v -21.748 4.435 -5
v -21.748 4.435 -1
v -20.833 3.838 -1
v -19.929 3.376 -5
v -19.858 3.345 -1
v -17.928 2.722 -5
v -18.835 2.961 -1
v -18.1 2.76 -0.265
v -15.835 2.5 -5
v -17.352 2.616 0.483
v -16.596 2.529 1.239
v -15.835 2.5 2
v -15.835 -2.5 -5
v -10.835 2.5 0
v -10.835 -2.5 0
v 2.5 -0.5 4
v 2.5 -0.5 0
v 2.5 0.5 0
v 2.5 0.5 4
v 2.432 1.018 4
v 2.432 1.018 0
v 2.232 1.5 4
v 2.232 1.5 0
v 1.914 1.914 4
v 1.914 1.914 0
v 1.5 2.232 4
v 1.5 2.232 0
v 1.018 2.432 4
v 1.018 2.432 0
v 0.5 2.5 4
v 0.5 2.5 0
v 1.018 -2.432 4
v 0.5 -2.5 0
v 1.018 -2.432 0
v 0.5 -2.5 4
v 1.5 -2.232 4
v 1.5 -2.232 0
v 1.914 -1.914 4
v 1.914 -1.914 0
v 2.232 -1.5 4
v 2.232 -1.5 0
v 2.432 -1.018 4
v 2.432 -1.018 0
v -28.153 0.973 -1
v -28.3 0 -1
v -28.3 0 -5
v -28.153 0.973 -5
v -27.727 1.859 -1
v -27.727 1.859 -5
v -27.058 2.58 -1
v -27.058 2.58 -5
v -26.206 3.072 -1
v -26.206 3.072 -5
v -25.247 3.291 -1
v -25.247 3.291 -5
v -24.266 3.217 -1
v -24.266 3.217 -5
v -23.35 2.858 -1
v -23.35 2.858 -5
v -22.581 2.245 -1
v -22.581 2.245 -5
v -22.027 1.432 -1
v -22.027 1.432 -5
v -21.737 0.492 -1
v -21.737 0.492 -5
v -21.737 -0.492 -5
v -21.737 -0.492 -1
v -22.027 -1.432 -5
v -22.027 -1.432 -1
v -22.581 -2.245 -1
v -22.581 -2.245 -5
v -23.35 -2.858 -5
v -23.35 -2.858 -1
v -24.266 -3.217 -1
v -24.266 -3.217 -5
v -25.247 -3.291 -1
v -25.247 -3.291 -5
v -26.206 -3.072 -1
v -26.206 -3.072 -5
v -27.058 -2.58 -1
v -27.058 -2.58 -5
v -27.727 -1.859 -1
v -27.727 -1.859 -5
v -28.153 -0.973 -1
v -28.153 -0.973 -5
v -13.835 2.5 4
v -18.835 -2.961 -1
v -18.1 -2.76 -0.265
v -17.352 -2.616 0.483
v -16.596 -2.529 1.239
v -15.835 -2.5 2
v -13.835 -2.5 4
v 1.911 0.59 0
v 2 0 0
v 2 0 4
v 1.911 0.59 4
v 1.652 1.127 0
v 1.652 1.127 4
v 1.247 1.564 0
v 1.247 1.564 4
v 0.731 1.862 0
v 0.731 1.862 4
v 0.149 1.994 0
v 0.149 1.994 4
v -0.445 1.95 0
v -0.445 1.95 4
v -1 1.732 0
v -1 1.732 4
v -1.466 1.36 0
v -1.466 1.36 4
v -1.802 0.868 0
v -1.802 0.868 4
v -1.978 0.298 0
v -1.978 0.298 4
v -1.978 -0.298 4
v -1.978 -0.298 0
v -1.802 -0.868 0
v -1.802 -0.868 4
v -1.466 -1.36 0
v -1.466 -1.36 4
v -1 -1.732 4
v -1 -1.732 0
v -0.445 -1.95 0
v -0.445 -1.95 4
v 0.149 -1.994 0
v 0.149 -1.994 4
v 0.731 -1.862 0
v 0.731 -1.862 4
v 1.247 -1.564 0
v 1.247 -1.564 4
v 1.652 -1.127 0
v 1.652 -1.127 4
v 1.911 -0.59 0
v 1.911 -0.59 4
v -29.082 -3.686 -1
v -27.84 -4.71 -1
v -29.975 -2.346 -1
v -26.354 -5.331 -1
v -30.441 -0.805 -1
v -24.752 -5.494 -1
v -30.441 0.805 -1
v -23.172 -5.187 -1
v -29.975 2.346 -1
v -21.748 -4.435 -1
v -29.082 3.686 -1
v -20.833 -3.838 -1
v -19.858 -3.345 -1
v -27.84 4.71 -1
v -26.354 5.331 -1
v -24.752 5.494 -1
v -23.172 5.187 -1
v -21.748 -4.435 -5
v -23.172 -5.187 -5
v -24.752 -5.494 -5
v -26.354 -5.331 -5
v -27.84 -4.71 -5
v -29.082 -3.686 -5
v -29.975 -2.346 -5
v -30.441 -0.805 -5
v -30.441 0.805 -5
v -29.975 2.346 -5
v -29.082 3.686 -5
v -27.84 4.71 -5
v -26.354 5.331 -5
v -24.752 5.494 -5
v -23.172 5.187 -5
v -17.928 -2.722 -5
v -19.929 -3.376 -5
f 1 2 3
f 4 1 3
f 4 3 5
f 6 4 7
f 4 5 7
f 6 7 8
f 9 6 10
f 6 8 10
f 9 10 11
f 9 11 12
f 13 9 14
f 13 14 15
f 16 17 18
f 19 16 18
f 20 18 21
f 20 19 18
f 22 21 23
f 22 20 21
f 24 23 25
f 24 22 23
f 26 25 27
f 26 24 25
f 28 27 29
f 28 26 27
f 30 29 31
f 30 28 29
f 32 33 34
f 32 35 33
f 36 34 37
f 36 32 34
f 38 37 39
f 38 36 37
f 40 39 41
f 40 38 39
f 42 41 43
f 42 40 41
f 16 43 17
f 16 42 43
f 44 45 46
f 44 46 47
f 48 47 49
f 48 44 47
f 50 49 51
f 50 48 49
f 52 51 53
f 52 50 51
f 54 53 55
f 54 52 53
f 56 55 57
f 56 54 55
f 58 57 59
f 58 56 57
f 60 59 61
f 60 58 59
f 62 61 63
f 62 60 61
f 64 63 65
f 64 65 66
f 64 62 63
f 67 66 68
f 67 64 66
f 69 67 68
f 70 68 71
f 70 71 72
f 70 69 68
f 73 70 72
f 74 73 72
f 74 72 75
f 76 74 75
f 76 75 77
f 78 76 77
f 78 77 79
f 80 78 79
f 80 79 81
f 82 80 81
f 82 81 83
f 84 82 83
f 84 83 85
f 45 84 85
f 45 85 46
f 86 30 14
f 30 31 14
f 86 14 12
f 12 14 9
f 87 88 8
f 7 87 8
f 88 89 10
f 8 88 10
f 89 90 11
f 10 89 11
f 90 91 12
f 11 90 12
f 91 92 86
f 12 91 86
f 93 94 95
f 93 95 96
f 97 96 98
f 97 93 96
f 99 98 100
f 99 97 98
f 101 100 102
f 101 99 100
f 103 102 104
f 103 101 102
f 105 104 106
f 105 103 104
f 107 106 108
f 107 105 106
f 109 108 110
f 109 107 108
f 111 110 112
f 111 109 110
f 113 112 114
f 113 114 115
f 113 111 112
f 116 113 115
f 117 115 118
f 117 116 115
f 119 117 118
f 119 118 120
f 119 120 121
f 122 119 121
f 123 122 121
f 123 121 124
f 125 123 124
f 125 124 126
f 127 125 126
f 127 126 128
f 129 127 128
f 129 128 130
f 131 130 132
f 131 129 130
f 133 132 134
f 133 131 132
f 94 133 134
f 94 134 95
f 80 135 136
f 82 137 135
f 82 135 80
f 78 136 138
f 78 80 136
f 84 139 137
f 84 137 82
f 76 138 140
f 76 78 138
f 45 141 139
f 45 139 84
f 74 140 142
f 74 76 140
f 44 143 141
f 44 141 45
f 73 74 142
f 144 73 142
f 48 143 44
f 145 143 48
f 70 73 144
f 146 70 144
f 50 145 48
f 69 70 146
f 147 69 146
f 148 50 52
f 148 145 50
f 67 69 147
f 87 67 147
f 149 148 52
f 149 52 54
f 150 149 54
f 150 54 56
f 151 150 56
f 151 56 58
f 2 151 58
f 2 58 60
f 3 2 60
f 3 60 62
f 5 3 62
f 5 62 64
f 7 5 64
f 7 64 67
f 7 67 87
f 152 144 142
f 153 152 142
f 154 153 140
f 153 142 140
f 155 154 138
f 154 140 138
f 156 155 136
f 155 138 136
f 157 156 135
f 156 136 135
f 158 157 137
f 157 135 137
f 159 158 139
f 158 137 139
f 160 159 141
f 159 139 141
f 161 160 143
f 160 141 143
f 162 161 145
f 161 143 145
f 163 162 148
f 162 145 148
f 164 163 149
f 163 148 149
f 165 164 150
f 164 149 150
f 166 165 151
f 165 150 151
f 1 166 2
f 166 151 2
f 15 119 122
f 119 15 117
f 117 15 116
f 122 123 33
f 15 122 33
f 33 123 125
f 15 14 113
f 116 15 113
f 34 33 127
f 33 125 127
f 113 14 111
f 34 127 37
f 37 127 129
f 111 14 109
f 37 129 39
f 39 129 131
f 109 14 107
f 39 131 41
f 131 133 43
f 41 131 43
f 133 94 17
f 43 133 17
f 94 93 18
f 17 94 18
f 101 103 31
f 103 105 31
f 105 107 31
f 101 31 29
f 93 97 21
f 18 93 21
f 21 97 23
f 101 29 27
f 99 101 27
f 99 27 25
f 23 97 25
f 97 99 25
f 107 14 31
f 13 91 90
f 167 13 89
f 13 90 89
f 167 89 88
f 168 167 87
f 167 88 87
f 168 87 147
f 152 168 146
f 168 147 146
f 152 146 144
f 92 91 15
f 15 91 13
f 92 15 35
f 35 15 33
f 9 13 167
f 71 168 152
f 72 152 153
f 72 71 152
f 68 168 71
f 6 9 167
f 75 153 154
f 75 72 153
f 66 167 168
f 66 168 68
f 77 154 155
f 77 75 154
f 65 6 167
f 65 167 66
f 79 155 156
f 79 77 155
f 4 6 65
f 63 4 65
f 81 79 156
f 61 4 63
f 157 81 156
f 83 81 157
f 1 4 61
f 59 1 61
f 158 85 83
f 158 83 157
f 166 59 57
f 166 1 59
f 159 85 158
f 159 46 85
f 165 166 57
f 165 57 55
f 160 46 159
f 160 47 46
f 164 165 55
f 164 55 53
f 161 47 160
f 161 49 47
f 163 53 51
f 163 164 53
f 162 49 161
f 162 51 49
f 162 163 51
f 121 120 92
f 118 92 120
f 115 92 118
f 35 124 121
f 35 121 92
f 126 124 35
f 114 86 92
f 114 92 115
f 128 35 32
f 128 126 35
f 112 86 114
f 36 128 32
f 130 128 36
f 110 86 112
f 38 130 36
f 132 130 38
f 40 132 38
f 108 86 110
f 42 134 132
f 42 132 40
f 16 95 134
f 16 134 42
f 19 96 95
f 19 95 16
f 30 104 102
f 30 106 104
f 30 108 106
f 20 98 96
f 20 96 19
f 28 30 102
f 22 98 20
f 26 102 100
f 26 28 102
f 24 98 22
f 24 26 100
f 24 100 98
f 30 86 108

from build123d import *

# Parameters (mm, degrees)
SKETCH_1_R          = 2
EXTRUDE_1_DEPTH     = 4
FILLET_1_R          = 10
FILLET_2_R          = 2
SKETCH_8_R          = 3.300000000000001
EXTRUDE_3_DEPTH     = 5
CHAMFER_1_SIZE      = 5
SKETCH_9_R          = 3.300000000000001
CUT_EXTRUDE_3_DEPTH = 5
CHAMFER_2_SIZE      = 5


with BuildPart() as part:
    # ｽｹｯﾁ1 → ﾎﾞｽ - 押し出し1 (new body)
    # profile 1 of 5: a face of its own
    with BuildSketch(Plane.XY):
        with BuildLine():
            ThreePointArc((-27.5, 2.1540659228538024), (-27.33345237791561, 2.333452377915602), (-27.15406592285381, 2.49999999999999))
            Line((-27.154065922853814, 2.499999999999997), (-27.499999999999996, 2.499999999999997))
            Line((-27.499999999999996, 2.499999999999997), (-27.499999999999996, 2.154065922853802))
        make_face()
    # profile 2 of 5: a face of its own
    with BuildSketch(Plane.XY):
        with BuildLine():
            Line((-27.5, -2.500000000000003), (-27.154065922853817, -2.500000000000003))
            ThreePointArc((-27.154065922853817, -2.499999999999992), (-27.333452377915613, -2.3334523779156044), (-27.5, -2.1540659228538055))
            Line((-27.5, -2.1540659228538055), (-27.5, -2.500000000000003))
        make_face()
    # profile 3 of 5: a face of its own
    with BuildSketch(Plane.XY):
        with BuildLine():
            ThreePointArc((-20.10102051443362, 2.49999999999994), (-30.499999999999996, -2.39e-15), (-20.101020514433618, -2.4999999999999454))
            Line((-20.1010205144336, -2.500000000000002), (-22.84593407714621, -2.5000000000000027))
            ThreePointArc((-22.845934077146207, -2.5000000000000133), (-25.000000000000018, -3.3000000000000043), (-27.154065922853817, -2.499999999999992))
            Line((-27.154065922853817, -2.500000000000003), (-27.5, -2.500000000000003))
            Line((-27.5, -2.500000000000003), (-27.5, -2.1540659228538055))
            ThreePointArc((-27.5, -2.1540659228538055), (-28.3, -1.19e-15), (-27.5, 2.1540659228538024))
            Line((-27.499999999999996, 2.154065922853802), (-27.499999999999996, 2.499999999999997))
            Line((-27.499999999999996, 2.499999999999997), (-27.154065922853814, 2.499999999999997))
            ThreePointArc((-27.15406592285381, 2.49999999999999), (-25.000000000000014, 3.299999999999998), (-22.845934077146207, 2.500000000000007))
            Line((-22.84593407714621, 2.4999999999999982), (-20.1010205144336, 2.4999999999999987))
        make_face()
    # profile 4 of 5: a face of its own
    with BuildSketch(Plane.XY):
        with BuildLine():
            Line((-22.84593407714621, -2.5000000000000027), (-20.1010205144336, -2.500000000000002))
            ThreePointArc((-20.101020514433618, -2.4999999999999454), (-19.652365608485606, -1.2856151891963796), (-19.500000000000004, -4.41e-15))
            ThreePointArc((-19.500000000000004, -3.06e-15), (-19.652365608485606, 1.2856151891963756), (-20.10102051443362, 2.49999999999994))
            Line((-20.1010205144336, 2.4999999999999987), (-22.84593407714621, 2.4999999999999982))
            ThreePointArc((-22.845934077146207, 2.5000000000000067), (-22.00013187411367, 1.3750604449591433), (-21.7, -3.06e-15))
            ThreePointArc((-21.7, -3.87e-15), (-22.00013187411367, -1.3750604449591517), (-22.845934077146207, -2.5000000000000133))
        make_face()
    # profile 5 of 5: a face of its own
    with BuildSketch(Plane.XY):
        with BuildLine():
            Line((-20.1010205144336, -2.500000000000002), (2.5, -2.4999999999999996))
            Line((2.5, -2.4999999999999996), (2.499999999999999, 2.500000000000005))
            Line((2.499999999999999, 2.500000000000005), (-20.1010205144336, 2.4999999999999987))
            ThreePointArc((-20.10102051443362, 2.49999999999994), (-19.652365608485606, 1.2856151891963756), (-19.500000000000004, -3.06e-15))
            ThreePointArc((-19.500000000000004, -4.41e-15), (-19.652365608485606, -1.2856151891963796), (-20.101020514433618, -2.4999999999999454))
        make_face()
        Circle(SKETCH_1_R, mode=Mode.SUBTRACT)
    extrude(amount=EXTRUDE_1_DEPTH)

    # ﾌｨﾚｯﾄ1
    fillet_1_edges = [part.edges().sort_by_distance(p)[0] for p in [
        (-20.10102051443361, 2.4999999999999694, 2),
        (-20.10102051443361, -2.4999999999999742, 2),
    ]]
    fillet(fillet_1_edges, radius=FILLET_1_R)

    # ﾌｨﾚｯﾄ2
    fillet_2_edges = [part.edges().sort_by_distance(p)[0] for p in [
        (2.499999999999999, 2.500000000000005, 2),
        (2.5, -2.4999999999999996, 2),
    ]]
    fillet(fillet_2_edges, radius=FILLET_2_R)

    # ｽｹｯﾁ8 → ﾎﾞｽ - 押し出し3 (add)
    with BuildSketch(Plane(origin=(0, 0, 0), x_dir=(-1, 0, 0), z_dir=(0, 0, -1))):
        with BuildLine():
            Line((15.83484861008833, 2.5), (15.834848610088294, -2.500000000000004))
            ThreePointArc((15.834848610088294, -2.500000000000004), (18.945703694279587, -2.996180733770167), (21.747849506805537, -4.435483870967743))
            ThreePointArc((21.747849506805537, -4.435483870967743), (30.499999999999996, -3.06e-15), (21.747849506805537, 4.435483870967737))
            ThreePointArc((21.747849506805537, 4.435483870967737), (18.9457036942796, 2.996180733770169), (15.83484861008833, 2.5))
        make_face()
        with Locations((25, -3.06e-15)):
            Circle(SKETCH_8_R, mode=Mode.SUBTRACT)
    extrude(amount=EXTRUDE_3_DEPTH)

    # 面取り1
    chamfer_1_edges = [part.edges().sort_by_distance(p)[0] for p in [
        (-15.834848610088311, -1.78e-15, 0),
    ]]
    chamfer(chamfer_1_edges, length=CHAMFER_1_SIZE - 0.0001)  # a hair under: the kernel refuses the full size

    # ｽｹｯﾁ9 → ｶｯﾄ - 押し出し3 (cut)
    with BuildSketch(Plane.XY.offset(4)):
        with BuildLine():
            Line((-18.834848610088333, -2.960607985830548), (-18.83484861008833, 2.9606079858305425))
            ThreePointArc((-18.83484861008833, 2.9606079858305425), (-20.351950663989726, 3.5783527846792875), (-21.747849506805537, 4.435483870967737))
            ThreePointArc((-21.747849506805537, 4.435483870967737), (-30.499999999999996, -1.29e-15), (-21.747849506805537, -4.435483870967743))
            ThreePointArc((-21.747849506805537, -4.435483870967743), (-20.35195066398973, -3.5783527846792946), (-18.834848610088333, -2.960607985830548))
        make_face()
        with Locations(Location((-25, -3.06e-15, 0), (0, 0, 180))):
            Circle(SKETCH_9_R, mode=Mode.SUBTRACT)
    extrude(amount=-CUT_EXTRUDE_3_DEPTH, mode=Mode.SUBTRACT)

    # 面取り2
    chamfer_2_edges = [part.edges().sort_by_distance(p)[0] for p in [
        (-18.83484861008833, -2.66e-15, 4),
    ]]
    chamfer(chamfer_2_edges, length=CHAMFER_2_SIZE - 0.0001)  # a hair under: the kernel refuses the full size


solid = part.part
